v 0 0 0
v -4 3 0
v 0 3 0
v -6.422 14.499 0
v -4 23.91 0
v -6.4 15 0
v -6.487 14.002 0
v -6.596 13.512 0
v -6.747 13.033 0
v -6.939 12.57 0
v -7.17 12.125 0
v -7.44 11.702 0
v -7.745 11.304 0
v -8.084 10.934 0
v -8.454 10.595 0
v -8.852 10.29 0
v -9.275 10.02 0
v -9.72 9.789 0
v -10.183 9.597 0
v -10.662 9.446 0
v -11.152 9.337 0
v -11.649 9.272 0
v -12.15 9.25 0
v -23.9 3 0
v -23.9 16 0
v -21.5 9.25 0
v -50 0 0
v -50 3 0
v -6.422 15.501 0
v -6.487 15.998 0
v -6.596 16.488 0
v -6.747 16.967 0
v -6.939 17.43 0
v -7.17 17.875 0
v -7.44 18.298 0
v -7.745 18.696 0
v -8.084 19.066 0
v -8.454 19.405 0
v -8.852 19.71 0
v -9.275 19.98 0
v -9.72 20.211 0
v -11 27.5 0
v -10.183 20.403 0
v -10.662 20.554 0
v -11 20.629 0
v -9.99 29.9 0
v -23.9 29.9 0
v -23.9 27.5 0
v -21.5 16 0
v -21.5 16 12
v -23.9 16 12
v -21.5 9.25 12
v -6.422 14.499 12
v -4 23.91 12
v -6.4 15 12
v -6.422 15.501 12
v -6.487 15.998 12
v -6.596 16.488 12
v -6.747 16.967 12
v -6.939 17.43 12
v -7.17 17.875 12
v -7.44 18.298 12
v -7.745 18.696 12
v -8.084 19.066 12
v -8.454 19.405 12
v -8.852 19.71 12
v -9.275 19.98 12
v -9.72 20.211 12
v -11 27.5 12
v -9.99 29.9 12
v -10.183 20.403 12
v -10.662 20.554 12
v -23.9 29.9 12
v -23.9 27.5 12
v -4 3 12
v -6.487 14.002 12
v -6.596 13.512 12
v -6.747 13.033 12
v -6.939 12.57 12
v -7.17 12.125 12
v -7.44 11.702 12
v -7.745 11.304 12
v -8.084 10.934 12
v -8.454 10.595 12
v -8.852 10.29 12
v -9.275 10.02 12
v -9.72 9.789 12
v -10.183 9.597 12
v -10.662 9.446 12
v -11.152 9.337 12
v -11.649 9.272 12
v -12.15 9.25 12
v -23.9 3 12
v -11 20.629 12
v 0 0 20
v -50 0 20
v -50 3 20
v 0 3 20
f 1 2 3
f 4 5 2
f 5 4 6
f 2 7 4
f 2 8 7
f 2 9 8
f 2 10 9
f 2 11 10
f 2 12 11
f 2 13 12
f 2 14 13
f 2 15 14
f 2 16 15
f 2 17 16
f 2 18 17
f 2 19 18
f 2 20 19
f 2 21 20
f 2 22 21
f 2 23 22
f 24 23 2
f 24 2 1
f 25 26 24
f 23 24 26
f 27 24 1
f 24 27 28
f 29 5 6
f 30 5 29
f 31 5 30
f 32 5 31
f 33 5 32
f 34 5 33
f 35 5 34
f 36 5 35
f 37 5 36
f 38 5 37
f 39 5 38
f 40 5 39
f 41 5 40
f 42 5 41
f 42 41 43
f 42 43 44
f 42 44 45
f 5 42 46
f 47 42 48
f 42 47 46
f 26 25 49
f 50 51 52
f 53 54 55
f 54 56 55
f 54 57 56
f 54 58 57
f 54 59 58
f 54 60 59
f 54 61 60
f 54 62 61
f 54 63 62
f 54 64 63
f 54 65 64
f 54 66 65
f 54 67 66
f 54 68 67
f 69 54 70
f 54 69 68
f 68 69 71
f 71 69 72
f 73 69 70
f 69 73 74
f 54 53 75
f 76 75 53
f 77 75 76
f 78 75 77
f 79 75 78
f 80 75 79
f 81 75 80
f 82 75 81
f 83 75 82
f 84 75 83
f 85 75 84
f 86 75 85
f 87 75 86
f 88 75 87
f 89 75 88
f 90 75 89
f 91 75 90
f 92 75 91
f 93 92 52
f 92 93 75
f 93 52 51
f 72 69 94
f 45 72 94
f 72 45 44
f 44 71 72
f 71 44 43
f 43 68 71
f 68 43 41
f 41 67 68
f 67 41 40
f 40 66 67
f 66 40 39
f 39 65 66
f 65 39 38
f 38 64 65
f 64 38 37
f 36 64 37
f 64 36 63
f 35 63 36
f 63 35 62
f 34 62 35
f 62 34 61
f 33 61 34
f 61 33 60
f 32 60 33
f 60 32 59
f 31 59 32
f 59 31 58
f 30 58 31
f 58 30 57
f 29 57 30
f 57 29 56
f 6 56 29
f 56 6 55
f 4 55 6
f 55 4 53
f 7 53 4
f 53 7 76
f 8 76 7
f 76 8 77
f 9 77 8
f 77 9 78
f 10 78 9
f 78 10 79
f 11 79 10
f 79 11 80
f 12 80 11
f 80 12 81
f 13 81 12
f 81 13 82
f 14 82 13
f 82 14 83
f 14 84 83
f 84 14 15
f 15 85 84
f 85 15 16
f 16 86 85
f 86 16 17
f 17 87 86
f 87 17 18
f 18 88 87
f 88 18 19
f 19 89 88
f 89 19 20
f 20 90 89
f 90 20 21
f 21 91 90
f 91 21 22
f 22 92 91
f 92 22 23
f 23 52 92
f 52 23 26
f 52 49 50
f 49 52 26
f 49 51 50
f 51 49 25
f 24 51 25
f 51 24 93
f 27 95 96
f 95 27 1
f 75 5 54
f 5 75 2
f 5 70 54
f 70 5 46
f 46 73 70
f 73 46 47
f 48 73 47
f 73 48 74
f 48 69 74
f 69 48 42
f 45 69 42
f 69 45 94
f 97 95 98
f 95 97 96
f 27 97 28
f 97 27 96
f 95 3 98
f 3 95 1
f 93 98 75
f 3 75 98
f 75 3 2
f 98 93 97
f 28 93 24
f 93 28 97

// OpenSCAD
// Curtain-rod hook v5 - NO-DRILL VHB TAPE + GRAVITY-LOCK SEAT (vhb or screw mount)
// No moving parts: the rod drops down the front channel, then rolls back under the roof into a
// pocket deeper than the channel floor. To escape it must lift, move forward, then lift again -
// a window slam can't do that, and loading/unloading the rod never pulls on the tape.
// Mount: one 19 mm strip of 3M VHB on the 20 x 50 mm plate (IPA-clean, press 30 s, wait 24 h).
// Units mm. In-use coordinates: X = along the rod, Y = out from the frame, Z = up.
// PART = "print"    -> one hook laid flat, ready for STL export (print 2)
//        "assembly" -> in-use orientation with a short piece of rod (for viewing only)

/* [What to show] */
PART = "print";        // ["print", "assembly"]
MOUNT = "vhb";         // ["vhb", "screw"]

/* [Rod] */
ROD_D = 10;
ROD_CLEAR = 1.5;
ROD_OFFSET = 15;

/* [Body] */
PLATE_W = 20;          // plate width (19 mm tape)
PLATE_H = 50;
PLATE_T = 3;
HOOK_W = 12;           // hook width along the rod (flush with the plate's bed side)
HOOK_LIFT = 4;         // hook bottom above plate bottom (hook low = long plate above resists peel)
WALL = 2.4;
SILL = 0.8;            // pocket depth below the channel floor, fraction of the bore radius
ROOF_TIP = 1;          // roof reaches this far past the rod axis
HEAD_CLR = 0.5;        // rod clearance under the roof while rolling into the pocket

/* [Screw option] */
SCREW_HOLE = 3.9;
CSK_D = 7.2;
SCREW_EDGE = 6;
ACCESS = 4.5;

$fn = 72;
R_IN = (ROD_D + ROD_CLEAR) / 2;
R_OUT = R_IN + WALL;
D = ROD_OFFSET;
ZC = HOOK_LIFT + R_OUT;
Z_FLOOR = ZC - R_IN + SILL * R_IN;
Z_ROOF = Z_FLOOR + ROD_D + HEAD_CLR;
Y_RT = D + ROOF_TIP;
Y_CF = Y_RT + ROD_D + ROD_CLEAR;
TOP = Z_ROOF + WALL;
Y1 = Y_CF + WALL;
Z0 = ZC - R_OUT;
Z_SCREWS = [TOP + ACCESS, PLATE_H - SCREW_EDGE];   // screw option: both above the hook

module rect(y0, y1, z0, z1) translate([y0, z0]) square([y1 - y0, z1 - z0]);
module inuse(w, x0 = 0) translate([x0, 0, 0]) rotate([90, 0, 90]) linear_extrude(w, convexity = 8) children();
module tear2d(r) { circle(r); translate([r * 0.7071, 0]) rotate(45) square(r, center = true); }
module csk_hole(x, z) {
    r = SCREW_HOLE / 2; h = (CSK_D - SCREW_HOLE) / 2;
    translate([x, 0, z]) {
        translate([0, 50, 0]) rotate([90, 0, 0]) linear_extrude(100, convexity = 4) tear2d(r);
        translate([0, PLATE_T - h, 0]) rotate([-90, 0, 0]) cylinder(h = h + 0.01, r1 = r, r2 = CSK_D / 2);
        translate([0, PLATE_T, 0]) rotate([-90, 0, 0]) cylinder(h = 1, r = CSK_D / 2);
    }
}

module profile() difference() {
    union() {
        rect(0, Y1, Z0 + 2, TOP);
        rect(0, Y1, Z0, ZC);
        translate([D, ZC]) circle(R_OUT);
    }
    translate([D, ZC]) circle(R_IN);                 // pocket
    rect(D - R_IN, Y_CF, ZC, Z_ROOF);                // headroom under the roof
    rect(D, Y_CF, Z_FLOOR, ZC + 0.01);               // channel floor level
    rect(Y_RT, Y_CF, Z_ROOF - 0.01, TOP + 1);        // entry channel
    polygon([[Y1 - 6, Z0 - 0.01], [Y1 + 0.01, Z0 - 0.01], [Y1 + 0.01, Z0 + 6]]);
}

module hook() difference() {
    union() {
        inuse(HOOK_W) profile();
        cube([PLATE_W, PLATE_T, PLATE_H]);
    }
    if (MOUNT == "screw") for (z = Z_SCREWS) csk_hole(PLATE_W / 2, z);
}

module rod() color("Gainsboro") translate([-25, D, ZC - ROD_CLEAR / 2]) rotate([0, 90, 0]) cylinder(d = ROD_D, h = 25);

if (PART == "print") rotate([0, -90, 0]) hook();
else { color("SteelBlue") hook(); rod(); }
